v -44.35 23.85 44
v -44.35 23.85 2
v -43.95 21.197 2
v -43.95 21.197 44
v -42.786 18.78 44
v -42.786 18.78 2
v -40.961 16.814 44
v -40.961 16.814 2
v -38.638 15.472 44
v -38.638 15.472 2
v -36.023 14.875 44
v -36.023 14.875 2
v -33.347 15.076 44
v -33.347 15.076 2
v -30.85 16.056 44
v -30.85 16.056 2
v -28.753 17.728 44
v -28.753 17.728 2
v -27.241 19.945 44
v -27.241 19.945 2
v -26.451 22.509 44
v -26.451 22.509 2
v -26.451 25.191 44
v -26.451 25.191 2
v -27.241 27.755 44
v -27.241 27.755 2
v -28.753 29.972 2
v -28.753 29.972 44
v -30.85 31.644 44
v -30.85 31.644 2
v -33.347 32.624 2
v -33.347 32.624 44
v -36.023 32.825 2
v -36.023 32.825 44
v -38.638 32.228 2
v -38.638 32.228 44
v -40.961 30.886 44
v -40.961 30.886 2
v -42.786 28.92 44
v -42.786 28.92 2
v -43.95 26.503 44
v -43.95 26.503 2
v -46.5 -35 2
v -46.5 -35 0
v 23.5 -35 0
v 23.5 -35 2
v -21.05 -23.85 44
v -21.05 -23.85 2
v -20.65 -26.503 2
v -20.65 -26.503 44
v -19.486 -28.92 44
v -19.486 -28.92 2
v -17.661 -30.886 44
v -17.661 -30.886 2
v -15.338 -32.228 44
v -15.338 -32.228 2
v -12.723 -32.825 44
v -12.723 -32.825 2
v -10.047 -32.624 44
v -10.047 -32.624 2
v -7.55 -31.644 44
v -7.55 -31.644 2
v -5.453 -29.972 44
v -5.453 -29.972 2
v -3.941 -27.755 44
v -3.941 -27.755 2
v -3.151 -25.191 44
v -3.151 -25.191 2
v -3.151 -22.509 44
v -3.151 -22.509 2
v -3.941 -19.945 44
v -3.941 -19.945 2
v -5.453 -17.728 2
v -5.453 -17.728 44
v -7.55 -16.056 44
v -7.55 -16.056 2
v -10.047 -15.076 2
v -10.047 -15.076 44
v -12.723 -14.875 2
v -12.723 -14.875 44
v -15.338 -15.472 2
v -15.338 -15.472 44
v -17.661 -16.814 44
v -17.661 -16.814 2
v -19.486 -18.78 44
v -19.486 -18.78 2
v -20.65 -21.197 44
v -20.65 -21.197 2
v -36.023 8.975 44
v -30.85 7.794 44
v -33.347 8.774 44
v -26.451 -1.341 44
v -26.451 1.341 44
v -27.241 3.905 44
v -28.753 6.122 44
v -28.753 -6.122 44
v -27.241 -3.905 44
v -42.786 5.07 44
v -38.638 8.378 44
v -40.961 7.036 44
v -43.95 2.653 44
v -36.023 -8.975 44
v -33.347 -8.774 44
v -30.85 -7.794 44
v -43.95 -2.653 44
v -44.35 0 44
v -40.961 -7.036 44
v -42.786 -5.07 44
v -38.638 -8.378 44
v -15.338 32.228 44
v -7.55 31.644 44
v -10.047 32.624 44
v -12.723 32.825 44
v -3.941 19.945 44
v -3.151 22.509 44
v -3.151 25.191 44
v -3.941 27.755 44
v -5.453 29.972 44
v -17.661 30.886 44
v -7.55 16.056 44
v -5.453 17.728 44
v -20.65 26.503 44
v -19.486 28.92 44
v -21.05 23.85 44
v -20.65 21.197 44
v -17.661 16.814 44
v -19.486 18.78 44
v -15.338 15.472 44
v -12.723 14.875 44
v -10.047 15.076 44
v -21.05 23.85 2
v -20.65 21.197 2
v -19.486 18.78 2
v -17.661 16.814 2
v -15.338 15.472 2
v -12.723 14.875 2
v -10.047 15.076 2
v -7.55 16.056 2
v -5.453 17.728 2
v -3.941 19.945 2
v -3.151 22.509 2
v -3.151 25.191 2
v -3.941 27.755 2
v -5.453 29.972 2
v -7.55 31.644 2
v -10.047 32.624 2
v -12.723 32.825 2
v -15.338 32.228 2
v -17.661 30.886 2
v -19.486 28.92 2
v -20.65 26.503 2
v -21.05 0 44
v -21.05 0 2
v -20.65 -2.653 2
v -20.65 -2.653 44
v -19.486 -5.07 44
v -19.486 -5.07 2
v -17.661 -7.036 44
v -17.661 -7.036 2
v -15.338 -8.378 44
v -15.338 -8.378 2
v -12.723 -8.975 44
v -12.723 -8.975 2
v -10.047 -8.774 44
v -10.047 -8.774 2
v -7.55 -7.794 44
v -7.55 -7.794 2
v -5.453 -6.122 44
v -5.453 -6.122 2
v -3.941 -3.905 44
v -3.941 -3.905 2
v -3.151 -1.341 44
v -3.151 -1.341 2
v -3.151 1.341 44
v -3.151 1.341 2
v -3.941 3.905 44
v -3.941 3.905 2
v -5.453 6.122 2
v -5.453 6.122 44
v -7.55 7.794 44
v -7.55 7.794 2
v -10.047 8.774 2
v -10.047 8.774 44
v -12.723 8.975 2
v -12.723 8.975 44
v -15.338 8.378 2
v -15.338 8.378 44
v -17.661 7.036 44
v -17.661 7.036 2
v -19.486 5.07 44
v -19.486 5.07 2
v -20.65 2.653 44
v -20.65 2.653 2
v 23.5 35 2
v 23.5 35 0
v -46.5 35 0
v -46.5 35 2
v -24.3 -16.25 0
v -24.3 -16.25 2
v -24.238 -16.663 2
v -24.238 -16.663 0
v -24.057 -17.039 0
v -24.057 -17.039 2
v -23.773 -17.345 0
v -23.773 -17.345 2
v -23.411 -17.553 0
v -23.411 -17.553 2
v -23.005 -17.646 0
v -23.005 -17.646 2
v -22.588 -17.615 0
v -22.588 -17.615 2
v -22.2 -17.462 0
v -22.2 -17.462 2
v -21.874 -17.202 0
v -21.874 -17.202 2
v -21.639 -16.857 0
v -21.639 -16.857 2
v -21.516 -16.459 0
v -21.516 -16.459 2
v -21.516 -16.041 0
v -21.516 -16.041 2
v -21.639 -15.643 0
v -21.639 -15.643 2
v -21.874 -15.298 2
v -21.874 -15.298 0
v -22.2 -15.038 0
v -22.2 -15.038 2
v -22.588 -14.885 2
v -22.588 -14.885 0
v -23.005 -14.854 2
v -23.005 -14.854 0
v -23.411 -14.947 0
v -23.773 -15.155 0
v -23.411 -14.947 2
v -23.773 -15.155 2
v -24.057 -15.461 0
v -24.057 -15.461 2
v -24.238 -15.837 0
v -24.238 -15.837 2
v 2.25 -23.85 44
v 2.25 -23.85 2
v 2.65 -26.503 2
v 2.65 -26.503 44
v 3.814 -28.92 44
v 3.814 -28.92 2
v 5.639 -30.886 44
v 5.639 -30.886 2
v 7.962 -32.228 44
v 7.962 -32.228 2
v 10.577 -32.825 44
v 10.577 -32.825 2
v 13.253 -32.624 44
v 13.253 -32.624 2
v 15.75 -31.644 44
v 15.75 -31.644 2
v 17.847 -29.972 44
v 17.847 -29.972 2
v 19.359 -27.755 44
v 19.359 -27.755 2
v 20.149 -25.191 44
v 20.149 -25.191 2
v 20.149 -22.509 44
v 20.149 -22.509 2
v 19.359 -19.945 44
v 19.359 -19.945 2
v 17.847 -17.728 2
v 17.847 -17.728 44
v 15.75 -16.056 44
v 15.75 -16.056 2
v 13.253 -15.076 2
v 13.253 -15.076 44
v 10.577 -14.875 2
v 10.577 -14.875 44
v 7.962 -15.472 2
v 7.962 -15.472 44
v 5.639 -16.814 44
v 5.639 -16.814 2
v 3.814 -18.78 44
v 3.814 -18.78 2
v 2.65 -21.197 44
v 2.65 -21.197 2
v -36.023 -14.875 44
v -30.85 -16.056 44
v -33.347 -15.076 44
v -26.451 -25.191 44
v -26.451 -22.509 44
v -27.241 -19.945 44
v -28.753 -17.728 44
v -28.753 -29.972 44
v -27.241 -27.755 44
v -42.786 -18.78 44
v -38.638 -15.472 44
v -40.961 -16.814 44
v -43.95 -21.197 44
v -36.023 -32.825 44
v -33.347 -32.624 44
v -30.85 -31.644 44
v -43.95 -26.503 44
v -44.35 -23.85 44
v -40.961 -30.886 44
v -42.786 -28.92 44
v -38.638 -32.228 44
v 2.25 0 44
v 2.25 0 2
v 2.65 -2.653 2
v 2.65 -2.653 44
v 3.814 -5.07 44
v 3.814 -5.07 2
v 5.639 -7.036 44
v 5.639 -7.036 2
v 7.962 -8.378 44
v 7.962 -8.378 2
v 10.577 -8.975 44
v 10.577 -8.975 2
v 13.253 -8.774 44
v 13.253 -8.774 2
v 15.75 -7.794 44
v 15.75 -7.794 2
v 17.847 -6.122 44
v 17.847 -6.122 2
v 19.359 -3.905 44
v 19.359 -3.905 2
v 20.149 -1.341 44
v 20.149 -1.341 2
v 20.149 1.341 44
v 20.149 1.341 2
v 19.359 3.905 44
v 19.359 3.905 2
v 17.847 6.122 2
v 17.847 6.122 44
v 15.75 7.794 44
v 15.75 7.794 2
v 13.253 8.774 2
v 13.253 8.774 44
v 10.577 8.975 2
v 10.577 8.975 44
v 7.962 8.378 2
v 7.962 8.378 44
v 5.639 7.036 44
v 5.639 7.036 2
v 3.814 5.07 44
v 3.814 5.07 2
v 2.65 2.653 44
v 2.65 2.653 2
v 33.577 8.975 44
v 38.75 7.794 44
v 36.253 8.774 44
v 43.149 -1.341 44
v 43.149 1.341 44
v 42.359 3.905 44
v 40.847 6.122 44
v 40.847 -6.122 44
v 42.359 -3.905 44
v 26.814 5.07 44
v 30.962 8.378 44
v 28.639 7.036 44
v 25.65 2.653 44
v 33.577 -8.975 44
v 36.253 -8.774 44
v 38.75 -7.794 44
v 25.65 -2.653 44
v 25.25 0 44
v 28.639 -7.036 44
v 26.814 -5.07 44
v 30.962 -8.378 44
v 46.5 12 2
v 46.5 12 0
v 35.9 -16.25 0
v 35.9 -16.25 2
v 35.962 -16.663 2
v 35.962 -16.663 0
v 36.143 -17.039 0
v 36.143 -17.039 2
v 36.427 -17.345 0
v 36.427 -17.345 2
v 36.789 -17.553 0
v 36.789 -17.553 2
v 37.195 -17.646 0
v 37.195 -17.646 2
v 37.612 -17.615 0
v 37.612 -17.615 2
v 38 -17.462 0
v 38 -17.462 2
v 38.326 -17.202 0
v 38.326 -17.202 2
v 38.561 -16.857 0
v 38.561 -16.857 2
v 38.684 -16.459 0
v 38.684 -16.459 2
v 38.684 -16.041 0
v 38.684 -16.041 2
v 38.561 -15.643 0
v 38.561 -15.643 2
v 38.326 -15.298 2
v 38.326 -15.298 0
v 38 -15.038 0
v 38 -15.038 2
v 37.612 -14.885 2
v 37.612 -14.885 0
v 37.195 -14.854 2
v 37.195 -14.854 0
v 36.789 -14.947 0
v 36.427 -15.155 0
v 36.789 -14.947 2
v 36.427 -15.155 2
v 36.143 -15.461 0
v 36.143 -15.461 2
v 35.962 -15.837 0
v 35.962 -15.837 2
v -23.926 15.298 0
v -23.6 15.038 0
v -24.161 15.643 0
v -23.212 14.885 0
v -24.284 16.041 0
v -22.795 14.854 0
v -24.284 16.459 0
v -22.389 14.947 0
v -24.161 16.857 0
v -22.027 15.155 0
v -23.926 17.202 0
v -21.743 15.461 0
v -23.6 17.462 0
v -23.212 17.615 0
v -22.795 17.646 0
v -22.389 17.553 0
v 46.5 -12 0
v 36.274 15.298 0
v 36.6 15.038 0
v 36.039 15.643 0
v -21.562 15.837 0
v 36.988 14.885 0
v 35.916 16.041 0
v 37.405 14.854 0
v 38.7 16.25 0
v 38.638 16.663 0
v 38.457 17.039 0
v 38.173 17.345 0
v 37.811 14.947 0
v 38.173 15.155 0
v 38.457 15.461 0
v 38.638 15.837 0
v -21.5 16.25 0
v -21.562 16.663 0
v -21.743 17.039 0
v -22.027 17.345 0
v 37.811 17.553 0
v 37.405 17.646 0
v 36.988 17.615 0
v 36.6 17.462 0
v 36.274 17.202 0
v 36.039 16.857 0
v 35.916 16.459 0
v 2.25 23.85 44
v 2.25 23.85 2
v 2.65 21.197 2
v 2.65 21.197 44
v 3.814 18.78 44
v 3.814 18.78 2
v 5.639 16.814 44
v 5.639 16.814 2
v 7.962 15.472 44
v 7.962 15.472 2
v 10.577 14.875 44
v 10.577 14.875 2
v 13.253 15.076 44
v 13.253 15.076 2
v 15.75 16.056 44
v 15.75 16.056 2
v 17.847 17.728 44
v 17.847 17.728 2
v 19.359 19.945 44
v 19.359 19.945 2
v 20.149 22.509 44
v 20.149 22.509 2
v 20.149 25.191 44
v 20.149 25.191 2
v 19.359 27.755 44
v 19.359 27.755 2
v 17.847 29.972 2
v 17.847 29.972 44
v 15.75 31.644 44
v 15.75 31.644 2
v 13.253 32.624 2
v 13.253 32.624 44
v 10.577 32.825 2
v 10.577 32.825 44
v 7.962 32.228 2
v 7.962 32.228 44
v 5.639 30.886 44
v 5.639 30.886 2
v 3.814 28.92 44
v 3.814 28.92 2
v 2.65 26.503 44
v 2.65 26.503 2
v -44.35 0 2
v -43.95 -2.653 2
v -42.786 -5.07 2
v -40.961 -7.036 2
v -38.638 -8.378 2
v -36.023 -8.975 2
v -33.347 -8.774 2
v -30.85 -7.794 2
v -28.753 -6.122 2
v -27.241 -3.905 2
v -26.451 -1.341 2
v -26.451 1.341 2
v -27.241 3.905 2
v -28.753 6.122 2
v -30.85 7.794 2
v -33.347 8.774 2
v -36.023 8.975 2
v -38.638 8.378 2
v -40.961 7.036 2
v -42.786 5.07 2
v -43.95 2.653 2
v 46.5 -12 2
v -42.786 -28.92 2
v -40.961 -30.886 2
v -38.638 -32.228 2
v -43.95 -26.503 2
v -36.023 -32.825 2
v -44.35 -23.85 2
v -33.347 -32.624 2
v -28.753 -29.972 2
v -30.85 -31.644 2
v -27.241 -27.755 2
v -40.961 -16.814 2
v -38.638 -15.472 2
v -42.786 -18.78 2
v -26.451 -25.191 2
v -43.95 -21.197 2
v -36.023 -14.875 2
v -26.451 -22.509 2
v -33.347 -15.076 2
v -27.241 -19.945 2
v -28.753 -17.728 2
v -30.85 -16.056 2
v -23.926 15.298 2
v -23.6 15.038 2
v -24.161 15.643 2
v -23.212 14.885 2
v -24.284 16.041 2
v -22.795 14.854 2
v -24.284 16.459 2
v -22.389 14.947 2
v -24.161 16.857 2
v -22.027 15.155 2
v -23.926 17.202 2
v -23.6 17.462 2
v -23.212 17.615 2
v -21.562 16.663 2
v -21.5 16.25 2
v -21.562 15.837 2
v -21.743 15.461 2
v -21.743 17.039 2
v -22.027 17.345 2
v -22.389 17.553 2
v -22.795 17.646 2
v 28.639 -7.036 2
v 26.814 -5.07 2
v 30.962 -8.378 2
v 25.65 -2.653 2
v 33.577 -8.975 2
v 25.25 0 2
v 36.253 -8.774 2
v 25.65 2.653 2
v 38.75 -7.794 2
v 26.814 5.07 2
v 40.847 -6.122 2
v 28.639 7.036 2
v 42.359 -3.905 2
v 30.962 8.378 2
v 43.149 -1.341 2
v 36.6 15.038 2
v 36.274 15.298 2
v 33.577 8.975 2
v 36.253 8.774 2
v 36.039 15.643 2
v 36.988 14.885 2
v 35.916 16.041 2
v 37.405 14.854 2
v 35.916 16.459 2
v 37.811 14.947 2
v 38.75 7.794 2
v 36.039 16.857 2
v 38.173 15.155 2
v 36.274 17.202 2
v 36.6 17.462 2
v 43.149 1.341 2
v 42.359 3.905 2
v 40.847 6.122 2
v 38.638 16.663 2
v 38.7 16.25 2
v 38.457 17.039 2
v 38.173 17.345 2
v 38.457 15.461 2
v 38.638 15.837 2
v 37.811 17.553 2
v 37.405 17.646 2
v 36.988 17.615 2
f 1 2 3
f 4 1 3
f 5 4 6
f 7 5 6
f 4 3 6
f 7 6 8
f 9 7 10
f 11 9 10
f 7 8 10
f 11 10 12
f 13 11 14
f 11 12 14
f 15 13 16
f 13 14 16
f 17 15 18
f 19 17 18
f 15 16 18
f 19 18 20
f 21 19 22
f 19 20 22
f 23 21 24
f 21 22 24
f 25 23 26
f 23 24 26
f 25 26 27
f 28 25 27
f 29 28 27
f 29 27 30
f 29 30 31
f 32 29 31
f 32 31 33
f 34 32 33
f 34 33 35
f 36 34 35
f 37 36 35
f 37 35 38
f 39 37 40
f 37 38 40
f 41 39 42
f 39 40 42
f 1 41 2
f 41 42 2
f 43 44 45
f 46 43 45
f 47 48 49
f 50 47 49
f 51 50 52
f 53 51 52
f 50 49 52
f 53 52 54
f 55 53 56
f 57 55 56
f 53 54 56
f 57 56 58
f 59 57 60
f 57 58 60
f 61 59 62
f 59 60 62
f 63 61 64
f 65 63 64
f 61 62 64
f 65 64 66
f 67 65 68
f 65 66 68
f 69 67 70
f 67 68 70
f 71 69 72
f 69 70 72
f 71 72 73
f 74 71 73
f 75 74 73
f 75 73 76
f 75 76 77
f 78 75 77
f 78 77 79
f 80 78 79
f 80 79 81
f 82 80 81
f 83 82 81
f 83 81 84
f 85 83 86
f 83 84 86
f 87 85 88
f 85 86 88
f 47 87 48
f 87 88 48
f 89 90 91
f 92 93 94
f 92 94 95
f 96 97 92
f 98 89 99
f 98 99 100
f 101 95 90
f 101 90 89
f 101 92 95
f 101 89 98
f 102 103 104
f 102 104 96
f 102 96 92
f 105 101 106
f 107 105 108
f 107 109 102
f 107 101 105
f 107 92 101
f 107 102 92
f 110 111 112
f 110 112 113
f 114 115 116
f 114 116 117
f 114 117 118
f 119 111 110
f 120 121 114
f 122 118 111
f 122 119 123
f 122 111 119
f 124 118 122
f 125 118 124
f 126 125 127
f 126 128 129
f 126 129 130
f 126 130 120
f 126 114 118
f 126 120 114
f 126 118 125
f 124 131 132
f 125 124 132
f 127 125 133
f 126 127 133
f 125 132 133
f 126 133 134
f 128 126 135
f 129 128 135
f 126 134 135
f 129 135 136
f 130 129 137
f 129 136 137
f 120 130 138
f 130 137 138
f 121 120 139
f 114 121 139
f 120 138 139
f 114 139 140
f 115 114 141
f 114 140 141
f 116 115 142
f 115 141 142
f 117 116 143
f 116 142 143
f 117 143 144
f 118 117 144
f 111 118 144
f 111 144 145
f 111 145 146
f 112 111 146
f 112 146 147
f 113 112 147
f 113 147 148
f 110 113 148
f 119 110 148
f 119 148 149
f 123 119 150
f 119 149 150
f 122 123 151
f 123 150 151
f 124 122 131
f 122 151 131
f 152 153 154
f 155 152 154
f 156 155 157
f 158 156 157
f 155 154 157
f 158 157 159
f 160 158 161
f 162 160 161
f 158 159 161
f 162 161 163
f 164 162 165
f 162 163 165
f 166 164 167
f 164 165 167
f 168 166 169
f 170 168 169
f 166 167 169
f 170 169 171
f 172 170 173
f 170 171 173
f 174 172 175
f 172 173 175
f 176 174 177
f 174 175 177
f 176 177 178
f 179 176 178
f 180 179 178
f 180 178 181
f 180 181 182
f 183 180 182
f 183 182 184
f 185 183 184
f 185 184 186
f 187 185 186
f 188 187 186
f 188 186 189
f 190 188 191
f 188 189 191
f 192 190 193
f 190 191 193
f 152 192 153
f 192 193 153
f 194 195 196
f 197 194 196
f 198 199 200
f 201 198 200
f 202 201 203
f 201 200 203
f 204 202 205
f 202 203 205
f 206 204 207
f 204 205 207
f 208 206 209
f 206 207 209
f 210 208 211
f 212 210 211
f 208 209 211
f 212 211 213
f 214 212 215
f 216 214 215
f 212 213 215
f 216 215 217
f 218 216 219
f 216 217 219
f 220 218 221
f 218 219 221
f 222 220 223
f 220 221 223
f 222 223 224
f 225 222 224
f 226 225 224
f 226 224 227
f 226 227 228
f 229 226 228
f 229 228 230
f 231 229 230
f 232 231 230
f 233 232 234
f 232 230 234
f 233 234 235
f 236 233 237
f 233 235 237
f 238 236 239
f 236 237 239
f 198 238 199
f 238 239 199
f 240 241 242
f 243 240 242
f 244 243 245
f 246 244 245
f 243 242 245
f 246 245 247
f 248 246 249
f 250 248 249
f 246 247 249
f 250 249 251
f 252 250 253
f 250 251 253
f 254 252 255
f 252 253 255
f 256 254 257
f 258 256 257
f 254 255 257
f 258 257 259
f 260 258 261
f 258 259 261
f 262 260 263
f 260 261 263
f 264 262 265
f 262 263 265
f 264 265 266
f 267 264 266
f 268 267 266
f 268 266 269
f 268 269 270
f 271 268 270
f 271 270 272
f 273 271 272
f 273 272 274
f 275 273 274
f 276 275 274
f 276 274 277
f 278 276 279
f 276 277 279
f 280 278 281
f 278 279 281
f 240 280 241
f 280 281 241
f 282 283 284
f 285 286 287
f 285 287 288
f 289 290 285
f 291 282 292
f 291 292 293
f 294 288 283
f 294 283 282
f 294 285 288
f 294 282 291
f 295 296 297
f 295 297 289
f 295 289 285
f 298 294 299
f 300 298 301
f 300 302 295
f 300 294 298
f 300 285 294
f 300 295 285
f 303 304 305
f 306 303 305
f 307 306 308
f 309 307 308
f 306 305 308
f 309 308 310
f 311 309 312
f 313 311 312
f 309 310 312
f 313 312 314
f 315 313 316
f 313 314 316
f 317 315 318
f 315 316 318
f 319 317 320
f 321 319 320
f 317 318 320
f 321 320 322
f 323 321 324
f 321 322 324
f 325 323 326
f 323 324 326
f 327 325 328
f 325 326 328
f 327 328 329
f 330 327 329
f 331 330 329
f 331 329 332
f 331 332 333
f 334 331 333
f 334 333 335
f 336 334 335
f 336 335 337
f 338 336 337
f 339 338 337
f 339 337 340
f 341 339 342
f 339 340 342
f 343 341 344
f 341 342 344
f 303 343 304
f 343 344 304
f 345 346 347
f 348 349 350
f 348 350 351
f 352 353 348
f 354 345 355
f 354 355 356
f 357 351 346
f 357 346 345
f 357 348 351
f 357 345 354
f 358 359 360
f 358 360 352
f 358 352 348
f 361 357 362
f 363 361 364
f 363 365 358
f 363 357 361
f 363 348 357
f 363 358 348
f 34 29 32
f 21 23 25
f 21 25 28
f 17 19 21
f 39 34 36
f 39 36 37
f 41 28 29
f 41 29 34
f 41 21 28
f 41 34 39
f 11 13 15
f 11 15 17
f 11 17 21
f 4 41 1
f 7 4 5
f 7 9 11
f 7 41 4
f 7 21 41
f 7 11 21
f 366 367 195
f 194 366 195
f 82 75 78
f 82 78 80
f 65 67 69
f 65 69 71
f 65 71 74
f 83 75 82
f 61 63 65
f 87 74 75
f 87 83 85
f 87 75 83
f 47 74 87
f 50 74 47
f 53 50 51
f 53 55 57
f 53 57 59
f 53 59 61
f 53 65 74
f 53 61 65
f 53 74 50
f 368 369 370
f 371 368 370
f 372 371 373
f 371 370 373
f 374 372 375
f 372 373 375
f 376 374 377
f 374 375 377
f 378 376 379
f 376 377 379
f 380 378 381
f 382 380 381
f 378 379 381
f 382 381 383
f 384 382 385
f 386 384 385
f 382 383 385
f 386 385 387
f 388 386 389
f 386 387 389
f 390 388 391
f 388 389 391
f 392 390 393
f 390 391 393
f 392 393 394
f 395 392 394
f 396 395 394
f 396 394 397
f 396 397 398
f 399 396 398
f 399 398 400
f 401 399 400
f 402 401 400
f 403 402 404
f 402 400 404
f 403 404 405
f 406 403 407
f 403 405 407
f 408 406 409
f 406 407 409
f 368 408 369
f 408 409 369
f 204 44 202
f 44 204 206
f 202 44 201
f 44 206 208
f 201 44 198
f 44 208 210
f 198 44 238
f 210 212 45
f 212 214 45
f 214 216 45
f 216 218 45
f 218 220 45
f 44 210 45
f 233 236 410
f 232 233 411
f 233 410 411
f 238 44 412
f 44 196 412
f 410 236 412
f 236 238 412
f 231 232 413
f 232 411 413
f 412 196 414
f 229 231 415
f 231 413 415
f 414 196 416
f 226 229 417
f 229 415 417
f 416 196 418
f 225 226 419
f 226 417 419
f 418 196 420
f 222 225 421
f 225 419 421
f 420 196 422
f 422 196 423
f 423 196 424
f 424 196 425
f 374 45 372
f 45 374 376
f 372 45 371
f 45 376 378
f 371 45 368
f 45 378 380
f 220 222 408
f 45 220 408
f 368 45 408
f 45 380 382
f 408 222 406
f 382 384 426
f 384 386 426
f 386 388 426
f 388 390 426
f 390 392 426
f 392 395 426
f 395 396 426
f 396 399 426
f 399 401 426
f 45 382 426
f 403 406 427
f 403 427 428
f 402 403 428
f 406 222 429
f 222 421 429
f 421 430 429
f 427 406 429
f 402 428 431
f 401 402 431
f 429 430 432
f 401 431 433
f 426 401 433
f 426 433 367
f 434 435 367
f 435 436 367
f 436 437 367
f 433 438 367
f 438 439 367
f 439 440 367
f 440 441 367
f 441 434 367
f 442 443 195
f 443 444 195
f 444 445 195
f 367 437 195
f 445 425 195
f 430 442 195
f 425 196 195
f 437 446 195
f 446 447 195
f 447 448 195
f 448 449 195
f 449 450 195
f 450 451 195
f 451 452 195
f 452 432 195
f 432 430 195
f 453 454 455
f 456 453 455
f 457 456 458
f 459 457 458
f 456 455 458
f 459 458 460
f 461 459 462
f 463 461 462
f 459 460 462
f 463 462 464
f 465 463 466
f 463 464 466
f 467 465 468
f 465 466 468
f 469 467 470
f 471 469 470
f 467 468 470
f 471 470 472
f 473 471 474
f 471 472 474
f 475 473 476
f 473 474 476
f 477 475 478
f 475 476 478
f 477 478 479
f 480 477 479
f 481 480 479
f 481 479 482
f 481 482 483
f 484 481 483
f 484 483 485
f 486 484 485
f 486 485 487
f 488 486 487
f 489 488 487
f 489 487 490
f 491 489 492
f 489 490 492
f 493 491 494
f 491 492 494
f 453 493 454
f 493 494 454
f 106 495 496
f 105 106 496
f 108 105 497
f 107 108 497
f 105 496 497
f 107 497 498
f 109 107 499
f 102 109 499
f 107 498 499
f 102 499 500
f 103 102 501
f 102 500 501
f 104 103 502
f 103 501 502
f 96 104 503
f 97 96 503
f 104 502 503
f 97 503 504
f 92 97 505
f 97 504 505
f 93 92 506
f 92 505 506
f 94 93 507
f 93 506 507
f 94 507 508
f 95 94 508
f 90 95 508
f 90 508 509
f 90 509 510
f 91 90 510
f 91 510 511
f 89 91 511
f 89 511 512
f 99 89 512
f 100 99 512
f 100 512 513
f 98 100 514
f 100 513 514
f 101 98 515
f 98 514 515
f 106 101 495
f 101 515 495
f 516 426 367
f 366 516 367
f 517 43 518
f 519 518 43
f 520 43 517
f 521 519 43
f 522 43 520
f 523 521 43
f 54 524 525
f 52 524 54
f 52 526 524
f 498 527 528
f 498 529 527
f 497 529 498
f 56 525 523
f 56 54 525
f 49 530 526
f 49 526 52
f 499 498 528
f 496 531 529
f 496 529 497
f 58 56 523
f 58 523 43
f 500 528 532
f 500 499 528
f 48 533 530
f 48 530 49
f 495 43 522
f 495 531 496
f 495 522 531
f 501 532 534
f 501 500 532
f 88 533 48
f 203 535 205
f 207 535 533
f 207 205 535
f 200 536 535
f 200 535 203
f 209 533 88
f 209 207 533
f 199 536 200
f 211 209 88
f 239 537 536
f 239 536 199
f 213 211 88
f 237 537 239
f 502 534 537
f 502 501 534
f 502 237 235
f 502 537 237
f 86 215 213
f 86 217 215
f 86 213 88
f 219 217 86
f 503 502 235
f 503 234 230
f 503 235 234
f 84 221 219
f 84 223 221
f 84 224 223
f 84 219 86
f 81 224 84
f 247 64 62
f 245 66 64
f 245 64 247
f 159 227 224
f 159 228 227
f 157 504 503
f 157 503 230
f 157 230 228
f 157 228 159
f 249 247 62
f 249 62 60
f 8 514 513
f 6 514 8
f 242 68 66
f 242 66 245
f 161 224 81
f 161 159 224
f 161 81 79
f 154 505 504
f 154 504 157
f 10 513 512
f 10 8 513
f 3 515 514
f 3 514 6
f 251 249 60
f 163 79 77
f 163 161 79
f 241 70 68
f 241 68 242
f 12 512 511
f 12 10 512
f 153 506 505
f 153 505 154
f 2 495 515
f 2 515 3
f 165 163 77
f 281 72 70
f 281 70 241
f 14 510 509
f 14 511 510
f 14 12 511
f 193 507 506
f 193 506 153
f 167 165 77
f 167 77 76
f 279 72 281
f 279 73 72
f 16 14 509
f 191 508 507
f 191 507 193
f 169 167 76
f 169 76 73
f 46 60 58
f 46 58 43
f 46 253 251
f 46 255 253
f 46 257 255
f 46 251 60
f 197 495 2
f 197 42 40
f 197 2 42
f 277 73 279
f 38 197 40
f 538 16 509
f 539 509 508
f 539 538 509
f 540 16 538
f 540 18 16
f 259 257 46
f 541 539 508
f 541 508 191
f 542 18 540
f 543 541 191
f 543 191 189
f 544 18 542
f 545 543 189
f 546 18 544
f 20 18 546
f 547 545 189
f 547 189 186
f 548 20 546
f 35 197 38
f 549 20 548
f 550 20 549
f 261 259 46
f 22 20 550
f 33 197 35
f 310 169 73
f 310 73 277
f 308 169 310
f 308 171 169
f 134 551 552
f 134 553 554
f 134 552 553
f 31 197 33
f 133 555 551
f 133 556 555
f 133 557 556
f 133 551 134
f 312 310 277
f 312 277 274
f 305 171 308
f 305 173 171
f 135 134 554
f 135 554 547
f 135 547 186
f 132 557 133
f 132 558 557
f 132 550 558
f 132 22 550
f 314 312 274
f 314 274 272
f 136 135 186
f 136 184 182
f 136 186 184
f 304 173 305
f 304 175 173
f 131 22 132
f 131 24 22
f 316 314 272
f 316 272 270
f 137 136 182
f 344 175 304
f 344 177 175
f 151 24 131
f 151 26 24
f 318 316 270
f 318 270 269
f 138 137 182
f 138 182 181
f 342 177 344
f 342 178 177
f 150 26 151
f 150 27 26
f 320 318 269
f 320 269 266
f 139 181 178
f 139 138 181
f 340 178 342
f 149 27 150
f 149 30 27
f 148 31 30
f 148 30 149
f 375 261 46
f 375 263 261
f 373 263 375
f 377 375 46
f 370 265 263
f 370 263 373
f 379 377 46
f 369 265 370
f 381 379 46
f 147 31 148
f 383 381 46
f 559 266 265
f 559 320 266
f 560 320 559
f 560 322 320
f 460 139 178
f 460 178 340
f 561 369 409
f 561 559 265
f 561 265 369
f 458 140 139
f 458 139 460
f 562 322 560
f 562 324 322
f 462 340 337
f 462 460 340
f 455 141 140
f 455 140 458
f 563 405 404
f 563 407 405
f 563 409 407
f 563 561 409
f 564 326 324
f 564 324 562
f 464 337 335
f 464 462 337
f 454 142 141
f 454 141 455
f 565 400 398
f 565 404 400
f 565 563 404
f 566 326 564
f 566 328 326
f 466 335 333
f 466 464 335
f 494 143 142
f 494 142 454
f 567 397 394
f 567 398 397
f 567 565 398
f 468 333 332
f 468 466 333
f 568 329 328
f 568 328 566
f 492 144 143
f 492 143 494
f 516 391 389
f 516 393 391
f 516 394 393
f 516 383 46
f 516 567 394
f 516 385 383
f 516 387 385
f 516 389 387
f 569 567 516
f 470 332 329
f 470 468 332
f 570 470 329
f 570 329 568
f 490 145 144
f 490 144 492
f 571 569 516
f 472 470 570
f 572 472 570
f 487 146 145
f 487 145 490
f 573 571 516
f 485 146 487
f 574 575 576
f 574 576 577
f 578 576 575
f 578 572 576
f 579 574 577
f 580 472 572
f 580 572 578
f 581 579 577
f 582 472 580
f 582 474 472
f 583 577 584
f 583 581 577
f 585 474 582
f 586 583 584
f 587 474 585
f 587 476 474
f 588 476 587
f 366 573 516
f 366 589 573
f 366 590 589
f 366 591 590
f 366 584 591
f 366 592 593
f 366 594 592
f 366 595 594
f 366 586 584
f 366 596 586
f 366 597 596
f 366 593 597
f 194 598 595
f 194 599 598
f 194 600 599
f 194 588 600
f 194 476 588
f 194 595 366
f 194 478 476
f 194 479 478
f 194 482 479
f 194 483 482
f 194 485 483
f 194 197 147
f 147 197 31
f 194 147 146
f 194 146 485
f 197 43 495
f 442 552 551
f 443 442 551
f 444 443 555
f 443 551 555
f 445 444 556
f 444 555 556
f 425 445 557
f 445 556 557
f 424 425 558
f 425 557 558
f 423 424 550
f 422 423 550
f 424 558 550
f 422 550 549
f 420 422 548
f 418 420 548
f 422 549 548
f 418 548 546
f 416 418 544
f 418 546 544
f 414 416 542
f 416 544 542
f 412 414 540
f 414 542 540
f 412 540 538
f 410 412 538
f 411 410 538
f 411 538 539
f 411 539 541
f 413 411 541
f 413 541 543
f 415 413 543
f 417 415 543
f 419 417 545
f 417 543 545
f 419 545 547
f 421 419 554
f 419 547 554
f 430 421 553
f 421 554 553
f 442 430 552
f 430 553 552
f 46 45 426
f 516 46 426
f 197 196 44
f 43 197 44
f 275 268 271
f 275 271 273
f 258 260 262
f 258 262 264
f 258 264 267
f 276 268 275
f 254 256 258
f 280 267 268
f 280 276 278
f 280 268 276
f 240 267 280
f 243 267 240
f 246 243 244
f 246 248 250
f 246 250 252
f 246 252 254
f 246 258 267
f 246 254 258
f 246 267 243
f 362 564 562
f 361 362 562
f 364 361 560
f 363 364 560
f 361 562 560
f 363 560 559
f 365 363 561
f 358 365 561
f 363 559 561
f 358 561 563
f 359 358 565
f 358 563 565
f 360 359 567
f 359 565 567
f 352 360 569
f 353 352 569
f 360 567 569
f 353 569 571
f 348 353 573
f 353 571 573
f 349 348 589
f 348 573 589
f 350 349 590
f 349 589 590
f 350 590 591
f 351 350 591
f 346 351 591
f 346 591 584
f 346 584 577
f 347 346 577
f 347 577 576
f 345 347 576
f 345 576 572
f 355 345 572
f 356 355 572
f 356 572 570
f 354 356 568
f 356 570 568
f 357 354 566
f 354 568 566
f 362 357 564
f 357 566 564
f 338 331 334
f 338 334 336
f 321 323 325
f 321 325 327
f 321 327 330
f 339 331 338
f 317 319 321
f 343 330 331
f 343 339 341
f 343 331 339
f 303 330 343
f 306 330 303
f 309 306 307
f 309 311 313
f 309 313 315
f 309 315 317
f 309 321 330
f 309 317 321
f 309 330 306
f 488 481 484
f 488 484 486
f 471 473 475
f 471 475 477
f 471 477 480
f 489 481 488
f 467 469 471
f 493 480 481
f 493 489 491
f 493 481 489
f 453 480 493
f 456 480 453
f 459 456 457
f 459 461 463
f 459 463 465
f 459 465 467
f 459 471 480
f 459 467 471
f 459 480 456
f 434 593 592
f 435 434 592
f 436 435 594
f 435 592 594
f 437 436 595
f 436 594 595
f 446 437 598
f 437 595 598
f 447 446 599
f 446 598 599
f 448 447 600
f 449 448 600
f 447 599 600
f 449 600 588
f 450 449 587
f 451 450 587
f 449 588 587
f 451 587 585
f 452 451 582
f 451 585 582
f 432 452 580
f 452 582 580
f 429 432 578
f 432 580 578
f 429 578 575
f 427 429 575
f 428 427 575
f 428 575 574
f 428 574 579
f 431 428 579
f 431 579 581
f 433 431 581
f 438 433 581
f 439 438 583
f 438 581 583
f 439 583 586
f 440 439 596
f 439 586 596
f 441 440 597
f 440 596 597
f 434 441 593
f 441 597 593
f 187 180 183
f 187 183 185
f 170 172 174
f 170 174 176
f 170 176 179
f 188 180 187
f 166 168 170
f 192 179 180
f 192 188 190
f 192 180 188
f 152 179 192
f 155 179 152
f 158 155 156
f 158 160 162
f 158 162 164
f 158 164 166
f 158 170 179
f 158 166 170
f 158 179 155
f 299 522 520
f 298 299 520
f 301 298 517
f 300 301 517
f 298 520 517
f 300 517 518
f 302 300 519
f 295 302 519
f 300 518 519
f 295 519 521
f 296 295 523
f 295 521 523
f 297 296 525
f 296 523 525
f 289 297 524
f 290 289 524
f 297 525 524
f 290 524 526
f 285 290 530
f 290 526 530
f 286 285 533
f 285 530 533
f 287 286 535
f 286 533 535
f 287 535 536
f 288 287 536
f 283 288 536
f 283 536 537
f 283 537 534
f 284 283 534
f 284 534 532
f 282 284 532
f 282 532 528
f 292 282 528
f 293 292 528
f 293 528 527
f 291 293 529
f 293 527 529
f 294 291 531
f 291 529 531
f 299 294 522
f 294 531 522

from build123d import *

# Parameters (mm, degrees)
EXTRUDE_1_DEPTH     = 2
SKETCH_3_R          = 1.4
CUT_EXTRUDE_1_DEPTH = 2
SKETCH_4_R          = 9
EXTRUDE_2_DEPTH     = 42


with BuildPart() as part:
    # 草图1 → 凸台-拉伸1 (new body)
    with BuildSketch(Plane.XY):
        Polygon((46.5, 12), (23.5, 35), (-46.5, 35), (-46.5, -35), (23.5, -35), (46.5, -12), align=None)
    extrude(amount=EXTRUDE_1_DEPTH)

    # 草图3 → 切除-拉伸1 (cut)
    with BuildSketch(Plane.XY.offset(2)):
        with Locations((-22.9, 16.25)):
            Circle(SKETCH_3_R)
        with Locations((37.3, 16.25)):
            Circle(SKETCH_3_R)
        with Locations(Location((37.3, -16.25, 0), (0, 0, 180))):
            Circle(SKETCH_3_R)
        with Locations(Location((-22.9, -16.25, 0), (0, 0, 180))):
            Circle(SKETCH_3_R)
    extrude(amount=-CUT_EXTRUDE_1_DEPTH, mode=Mode.SUBTRACT)

    # 草图4 → 凸台-拉伸2 (add)
    with BuildSketch(Plane.XY.offset(2)):
        with Locations(Location((-35.35, -23.85, 0), (0, 0, 180))):
            Circle(SKETCH_4_R)
        with Locations(Location((-12.05, -23.85, 0), (0, 0, 180))):
            Circle(SKETCH_4_R)
        with Locations(Location((11.25, -23.85, 0), (0, 0, 180))):
            Circle(SKETCH_4_R)
        with Locations(Location((-12.05, 0, 0), (0, 0, 180))):
            Circle(SKETCH_4_R)
        with Locations(Location((11.25, 0, 0), (0, 0, 180))):
            Circle(SKETCH_4_R)
        with Locations(Location((-12.05, 23.85, 0), (0, 0, 180))):
            Circle(SKETCH_4_R)
        with Locations(Location((11.25, 23.85, 0), (0, 0, 180))):
            Circle(SKETCH_4_R)
        with Locations(Location((-35.35, 0, 0), (0, 0, 180))):
            Circle(SKETCH_4_R)
        with Locations(Location((-35.35, 23.85, 0), (0, 0, 180))):
            Circle(SKETCH_4_R)
        with Locations(Location((34.25, 0, 0), (0, 0, 180))):
            Circle(SKETCH_4_R)
    extrude(amount=EXTRUDE_2_DEPTH)


solid = part.part
